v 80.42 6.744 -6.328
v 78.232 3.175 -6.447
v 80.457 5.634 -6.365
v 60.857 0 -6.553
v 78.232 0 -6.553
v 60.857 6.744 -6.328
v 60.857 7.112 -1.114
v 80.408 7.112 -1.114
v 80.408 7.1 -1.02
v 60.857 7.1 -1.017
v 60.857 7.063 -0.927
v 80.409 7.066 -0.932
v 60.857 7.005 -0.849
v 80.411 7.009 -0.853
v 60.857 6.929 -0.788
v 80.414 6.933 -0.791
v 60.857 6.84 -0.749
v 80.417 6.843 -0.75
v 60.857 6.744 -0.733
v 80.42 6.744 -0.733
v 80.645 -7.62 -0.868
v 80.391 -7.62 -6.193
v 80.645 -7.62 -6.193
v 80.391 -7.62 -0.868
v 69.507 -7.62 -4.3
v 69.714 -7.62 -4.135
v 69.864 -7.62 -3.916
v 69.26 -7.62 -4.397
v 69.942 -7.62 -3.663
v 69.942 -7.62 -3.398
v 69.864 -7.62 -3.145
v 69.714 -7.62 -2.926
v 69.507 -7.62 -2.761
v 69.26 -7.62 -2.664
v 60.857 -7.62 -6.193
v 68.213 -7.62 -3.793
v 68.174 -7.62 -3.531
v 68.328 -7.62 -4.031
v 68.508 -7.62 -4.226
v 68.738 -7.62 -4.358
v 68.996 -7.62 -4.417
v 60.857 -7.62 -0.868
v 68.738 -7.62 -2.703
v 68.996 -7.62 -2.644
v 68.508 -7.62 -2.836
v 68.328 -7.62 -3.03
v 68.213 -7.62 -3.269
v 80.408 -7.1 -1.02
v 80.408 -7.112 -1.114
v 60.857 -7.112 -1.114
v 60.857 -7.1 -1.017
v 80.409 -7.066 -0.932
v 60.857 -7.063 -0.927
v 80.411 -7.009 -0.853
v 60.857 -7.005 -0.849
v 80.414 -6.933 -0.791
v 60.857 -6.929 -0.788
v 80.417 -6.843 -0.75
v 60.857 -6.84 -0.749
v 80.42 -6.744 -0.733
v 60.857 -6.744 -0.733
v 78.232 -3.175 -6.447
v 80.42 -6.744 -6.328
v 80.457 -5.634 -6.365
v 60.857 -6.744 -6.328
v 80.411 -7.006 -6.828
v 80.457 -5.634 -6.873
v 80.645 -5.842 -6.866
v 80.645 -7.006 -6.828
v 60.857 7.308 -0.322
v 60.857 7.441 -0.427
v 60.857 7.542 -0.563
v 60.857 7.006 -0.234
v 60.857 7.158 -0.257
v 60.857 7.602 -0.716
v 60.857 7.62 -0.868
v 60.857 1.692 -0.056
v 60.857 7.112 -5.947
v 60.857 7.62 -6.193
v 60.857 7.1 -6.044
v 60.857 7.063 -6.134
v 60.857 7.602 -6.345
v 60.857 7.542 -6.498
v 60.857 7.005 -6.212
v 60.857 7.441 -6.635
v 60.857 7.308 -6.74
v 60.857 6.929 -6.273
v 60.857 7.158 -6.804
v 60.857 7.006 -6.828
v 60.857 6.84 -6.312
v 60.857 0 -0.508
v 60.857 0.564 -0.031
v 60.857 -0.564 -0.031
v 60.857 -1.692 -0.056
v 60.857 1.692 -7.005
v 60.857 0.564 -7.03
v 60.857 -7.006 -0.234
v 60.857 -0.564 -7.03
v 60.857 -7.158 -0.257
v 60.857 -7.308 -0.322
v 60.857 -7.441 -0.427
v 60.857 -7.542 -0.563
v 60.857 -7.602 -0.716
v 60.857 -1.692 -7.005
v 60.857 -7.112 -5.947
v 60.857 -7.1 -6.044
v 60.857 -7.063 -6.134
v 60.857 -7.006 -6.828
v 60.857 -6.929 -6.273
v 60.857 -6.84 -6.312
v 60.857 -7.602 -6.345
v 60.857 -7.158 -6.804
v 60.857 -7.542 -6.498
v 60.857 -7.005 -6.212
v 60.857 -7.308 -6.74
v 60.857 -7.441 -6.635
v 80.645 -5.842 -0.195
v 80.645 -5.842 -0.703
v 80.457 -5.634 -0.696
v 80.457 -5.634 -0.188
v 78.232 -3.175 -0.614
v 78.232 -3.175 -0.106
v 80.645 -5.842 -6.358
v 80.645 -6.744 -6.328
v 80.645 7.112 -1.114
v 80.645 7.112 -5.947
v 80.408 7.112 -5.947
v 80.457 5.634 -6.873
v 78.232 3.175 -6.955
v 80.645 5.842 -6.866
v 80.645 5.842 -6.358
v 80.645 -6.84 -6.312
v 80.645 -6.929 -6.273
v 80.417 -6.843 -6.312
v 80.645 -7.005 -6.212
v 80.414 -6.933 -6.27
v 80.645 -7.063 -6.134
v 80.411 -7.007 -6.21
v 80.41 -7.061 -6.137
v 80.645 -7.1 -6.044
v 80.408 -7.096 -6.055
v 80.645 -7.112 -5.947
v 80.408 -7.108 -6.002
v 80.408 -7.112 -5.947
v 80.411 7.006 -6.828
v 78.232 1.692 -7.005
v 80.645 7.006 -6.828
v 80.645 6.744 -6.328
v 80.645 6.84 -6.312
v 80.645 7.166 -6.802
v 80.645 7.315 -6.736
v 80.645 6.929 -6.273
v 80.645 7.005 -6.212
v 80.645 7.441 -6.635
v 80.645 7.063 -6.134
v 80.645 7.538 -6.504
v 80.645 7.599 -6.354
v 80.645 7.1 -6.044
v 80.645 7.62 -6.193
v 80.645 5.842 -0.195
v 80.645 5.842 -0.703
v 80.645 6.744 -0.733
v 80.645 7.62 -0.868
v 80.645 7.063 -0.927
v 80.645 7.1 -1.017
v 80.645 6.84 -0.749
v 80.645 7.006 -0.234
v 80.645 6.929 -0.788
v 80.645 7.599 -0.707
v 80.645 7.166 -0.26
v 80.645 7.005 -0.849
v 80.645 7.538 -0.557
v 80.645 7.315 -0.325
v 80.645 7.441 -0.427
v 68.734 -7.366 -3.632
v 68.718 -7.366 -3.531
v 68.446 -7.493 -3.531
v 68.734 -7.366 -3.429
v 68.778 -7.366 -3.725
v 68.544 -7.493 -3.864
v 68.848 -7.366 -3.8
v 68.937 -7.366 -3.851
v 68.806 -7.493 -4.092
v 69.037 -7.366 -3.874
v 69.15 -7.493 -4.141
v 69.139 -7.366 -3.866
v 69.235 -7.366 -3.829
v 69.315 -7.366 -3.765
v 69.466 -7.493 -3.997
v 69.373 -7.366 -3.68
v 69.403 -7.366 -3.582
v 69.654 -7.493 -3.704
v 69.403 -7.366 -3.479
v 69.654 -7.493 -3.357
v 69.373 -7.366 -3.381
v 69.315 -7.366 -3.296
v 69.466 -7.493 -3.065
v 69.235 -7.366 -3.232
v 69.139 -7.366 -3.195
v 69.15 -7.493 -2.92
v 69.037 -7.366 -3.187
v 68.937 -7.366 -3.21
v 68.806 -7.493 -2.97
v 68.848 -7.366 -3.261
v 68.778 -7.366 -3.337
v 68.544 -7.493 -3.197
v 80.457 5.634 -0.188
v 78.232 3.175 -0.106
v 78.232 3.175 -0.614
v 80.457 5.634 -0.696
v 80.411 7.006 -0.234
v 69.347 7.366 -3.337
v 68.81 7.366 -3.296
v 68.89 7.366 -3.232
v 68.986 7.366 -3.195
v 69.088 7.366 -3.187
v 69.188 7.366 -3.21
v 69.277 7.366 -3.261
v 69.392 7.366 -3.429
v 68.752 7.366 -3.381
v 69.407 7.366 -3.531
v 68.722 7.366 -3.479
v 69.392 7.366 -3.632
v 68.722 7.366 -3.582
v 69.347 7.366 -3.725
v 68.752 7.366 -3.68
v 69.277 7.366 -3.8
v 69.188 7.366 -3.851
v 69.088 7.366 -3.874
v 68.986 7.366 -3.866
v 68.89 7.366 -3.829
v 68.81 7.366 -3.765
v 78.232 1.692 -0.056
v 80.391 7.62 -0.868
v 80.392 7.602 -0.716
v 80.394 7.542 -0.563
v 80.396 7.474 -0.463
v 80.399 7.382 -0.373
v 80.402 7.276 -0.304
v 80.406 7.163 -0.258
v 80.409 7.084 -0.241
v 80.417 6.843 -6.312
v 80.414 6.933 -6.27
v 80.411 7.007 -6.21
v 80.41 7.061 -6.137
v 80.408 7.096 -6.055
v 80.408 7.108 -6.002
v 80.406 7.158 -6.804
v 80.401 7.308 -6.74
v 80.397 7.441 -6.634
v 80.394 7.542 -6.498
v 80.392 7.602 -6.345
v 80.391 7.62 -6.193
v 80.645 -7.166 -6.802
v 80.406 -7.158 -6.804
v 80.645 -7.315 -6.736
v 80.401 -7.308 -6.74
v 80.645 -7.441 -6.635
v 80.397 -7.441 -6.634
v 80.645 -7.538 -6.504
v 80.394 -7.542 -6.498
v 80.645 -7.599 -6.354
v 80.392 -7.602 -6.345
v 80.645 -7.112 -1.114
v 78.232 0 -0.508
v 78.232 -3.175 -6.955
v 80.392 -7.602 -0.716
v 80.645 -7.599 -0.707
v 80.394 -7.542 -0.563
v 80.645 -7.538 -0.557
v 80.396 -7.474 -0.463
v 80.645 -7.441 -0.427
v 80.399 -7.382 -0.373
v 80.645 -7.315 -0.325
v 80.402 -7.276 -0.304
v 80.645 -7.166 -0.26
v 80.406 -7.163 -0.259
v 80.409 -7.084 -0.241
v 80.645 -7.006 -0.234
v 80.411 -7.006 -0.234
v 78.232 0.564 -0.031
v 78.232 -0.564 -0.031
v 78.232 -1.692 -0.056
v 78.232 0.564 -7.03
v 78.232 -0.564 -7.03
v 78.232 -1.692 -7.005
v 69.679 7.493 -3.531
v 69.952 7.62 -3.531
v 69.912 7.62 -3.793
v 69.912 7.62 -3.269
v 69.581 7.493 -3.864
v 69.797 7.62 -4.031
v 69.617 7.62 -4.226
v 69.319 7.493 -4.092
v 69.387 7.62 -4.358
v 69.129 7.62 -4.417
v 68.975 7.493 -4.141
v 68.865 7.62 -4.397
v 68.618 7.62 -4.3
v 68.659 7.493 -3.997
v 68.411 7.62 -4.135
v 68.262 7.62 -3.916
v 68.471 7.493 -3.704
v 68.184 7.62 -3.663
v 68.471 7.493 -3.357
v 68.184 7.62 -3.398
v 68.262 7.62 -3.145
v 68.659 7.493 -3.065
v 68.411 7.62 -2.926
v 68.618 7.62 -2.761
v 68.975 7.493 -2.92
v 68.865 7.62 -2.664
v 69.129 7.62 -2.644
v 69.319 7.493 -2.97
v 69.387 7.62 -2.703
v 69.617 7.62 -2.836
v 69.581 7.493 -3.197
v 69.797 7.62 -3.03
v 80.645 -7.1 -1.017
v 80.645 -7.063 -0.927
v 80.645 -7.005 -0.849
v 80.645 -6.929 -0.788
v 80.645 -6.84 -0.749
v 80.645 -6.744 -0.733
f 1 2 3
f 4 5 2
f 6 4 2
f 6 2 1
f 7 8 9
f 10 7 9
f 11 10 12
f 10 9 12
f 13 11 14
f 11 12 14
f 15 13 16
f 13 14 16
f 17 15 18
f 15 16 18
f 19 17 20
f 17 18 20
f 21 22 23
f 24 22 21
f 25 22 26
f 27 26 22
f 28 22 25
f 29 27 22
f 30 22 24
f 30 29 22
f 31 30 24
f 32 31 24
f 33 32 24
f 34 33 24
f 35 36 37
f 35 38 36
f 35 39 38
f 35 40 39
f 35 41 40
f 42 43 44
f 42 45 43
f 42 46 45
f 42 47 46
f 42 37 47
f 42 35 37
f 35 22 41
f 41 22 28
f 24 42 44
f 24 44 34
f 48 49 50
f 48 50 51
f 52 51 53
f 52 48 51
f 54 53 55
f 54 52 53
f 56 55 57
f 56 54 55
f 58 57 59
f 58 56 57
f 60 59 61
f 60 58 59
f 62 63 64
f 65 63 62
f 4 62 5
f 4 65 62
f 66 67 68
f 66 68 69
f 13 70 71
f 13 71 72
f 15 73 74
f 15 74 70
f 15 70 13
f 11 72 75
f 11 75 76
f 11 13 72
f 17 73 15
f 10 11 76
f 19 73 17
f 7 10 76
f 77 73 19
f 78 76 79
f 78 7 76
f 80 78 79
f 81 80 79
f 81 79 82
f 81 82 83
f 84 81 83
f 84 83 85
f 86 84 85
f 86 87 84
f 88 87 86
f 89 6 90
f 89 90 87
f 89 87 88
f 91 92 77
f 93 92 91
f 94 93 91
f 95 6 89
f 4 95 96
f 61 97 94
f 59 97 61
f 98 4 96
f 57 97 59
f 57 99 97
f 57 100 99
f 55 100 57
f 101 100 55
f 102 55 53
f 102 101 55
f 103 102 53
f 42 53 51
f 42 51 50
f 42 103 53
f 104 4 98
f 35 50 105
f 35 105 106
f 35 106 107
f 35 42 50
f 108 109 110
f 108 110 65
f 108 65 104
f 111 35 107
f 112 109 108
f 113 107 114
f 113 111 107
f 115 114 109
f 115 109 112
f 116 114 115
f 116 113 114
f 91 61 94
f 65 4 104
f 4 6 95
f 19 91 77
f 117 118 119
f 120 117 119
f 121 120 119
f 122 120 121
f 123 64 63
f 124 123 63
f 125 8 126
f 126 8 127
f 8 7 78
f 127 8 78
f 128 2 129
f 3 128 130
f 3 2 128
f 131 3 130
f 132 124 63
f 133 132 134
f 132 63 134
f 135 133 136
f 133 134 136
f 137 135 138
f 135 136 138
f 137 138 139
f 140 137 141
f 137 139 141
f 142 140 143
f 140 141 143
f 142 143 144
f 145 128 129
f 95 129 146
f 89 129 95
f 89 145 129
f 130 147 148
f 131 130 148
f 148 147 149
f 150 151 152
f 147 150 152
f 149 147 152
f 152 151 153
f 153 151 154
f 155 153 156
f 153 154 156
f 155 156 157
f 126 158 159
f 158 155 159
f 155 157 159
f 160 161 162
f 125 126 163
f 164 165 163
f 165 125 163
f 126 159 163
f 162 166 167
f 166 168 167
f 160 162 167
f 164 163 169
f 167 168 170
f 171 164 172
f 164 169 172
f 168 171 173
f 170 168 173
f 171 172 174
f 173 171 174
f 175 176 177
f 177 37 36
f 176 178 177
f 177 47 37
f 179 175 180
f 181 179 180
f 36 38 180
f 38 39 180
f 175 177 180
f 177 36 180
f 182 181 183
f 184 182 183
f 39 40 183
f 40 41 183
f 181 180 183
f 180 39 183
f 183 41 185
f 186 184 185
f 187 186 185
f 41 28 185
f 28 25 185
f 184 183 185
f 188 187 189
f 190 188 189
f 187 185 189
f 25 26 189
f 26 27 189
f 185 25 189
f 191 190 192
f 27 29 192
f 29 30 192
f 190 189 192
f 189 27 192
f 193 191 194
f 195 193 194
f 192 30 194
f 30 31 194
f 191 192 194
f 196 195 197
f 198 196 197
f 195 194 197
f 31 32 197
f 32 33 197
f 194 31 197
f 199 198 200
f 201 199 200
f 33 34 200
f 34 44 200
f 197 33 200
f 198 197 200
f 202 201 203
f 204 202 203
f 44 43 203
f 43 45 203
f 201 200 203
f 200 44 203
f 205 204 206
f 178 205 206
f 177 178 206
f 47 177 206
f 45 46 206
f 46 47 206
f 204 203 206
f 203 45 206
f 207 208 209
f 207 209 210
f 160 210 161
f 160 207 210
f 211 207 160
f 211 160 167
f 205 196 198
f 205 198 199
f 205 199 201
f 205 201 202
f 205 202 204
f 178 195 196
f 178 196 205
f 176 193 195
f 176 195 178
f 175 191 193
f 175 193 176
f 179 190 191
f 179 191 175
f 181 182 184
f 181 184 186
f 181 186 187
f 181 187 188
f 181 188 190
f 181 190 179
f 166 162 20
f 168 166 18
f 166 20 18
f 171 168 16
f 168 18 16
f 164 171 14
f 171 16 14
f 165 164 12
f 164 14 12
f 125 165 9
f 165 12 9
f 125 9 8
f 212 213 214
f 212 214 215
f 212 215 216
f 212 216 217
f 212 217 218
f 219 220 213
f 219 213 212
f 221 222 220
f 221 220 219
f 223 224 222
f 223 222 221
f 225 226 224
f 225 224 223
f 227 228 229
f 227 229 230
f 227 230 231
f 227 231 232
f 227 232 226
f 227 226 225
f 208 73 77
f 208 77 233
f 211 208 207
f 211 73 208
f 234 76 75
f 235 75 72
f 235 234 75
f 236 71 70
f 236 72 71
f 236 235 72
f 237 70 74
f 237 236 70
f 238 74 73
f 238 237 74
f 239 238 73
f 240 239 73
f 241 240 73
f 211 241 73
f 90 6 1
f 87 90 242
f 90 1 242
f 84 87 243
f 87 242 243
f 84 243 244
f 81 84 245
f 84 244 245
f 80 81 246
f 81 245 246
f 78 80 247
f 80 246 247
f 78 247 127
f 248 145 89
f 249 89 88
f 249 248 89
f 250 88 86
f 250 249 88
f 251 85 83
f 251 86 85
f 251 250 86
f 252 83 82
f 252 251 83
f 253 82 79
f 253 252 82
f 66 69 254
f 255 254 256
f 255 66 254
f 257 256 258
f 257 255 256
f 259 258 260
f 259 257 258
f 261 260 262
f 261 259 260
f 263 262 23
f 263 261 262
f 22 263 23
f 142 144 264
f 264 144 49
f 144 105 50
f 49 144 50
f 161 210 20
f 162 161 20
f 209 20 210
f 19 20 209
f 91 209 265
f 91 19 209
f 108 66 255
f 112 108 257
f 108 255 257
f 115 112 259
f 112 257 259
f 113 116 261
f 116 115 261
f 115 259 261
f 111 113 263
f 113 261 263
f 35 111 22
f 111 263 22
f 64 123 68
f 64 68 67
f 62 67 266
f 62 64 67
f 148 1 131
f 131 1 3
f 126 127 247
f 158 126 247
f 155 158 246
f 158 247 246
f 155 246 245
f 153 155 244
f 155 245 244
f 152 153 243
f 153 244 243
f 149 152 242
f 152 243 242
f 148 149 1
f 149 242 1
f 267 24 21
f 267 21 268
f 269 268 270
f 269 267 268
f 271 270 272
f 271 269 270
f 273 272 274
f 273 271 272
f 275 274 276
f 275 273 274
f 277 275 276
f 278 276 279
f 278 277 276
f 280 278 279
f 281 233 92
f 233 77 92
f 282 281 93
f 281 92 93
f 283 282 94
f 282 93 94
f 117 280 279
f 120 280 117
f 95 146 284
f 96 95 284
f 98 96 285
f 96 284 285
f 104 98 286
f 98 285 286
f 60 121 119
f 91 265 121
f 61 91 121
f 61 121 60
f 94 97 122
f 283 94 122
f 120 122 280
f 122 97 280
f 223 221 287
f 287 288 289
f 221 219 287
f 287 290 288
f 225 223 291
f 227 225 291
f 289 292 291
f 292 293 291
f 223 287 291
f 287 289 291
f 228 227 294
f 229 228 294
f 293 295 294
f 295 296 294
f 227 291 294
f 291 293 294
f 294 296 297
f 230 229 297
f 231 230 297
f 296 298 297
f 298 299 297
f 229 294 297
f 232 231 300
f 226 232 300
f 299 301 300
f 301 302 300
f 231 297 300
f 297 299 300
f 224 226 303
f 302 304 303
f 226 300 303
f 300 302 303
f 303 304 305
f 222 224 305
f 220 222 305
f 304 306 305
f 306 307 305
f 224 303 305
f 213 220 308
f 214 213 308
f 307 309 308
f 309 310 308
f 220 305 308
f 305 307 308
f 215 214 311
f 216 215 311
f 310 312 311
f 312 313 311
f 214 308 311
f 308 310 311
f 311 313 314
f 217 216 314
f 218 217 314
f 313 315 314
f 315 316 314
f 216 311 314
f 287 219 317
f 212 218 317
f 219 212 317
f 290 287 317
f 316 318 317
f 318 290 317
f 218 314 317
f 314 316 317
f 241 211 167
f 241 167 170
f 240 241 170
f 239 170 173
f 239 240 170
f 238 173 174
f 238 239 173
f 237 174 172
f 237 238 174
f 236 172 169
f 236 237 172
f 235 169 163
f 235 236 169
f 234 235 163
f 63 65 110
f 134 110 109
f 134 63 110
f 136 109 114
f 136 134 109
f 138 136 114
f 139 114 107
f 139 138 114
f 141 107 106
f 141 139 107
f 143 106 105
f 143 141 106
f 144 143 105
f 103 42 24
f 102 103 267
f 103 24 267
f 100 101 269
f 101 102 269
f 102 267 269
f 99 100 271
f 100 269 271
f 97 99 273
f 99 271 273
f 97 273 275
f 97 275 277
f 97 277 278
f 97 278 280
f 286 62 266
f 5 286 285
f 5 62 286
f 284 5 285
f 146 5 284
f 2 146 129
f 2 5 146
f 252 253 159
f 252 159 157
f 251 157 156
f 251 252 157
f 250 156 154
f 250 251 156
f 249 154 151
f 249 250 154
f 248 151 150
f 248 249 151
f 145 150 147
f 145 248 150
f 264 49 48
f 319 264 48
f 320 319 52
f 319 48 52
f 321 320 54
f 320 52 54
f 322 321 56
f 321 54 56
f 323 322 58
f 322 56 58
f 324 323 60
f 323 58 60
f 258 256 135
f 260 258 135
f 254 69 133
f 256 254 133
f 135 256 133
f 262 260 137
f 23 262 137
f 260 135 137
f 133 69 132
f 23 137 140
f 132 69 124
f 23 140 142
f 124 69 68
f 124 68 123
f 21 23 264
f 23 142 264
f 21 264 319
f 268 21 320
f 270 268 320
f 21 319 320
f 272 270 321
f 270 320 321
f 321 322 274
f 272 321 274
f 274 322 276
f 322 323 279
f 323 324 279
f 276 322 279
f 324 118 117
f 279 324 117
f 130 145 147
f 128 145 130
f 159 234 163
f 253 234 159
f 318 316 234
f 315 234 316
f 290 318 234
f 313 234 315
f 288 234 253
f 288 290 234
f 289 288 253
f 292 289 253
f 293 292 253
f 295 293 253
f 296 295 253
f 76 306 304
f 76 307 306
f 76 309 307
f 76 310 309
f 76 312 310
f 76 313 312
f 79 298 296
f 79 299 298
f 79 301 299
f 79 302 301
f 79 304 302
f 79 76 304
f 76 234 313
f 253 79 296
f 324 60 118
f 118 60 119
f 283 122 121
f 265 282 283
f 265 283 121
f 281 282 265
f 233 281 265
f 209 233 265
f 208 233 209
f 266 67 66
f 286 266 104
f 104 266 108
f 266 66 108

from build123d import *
from build123d.topology import SkipClean

# Parameters (mm, degrees)
SKETCH1_W                     = 80.645
SKETCH1_H                     = 7.0612
BOSS_EXTRUDE1_DEPTH           = 7.62
BOSS_EXTRUDE1_TAPER           = 1.909
BOSS_EXTRUDE1_OTHER_WAY_DEPTH = 7.62
BOSS_EXTRUDE1_OTHER_WAY_TAPER = 1.909
CUT_EXTRUDE1_DEPTH            = 82.311382902
FILLET2_R                     = 0.635
FILLET3_R                     = 0.381
FILLET4_R                     = 50.8
BOSS_EXTRUDE2_DEPTH           = 80.645
CUT_EXTRUDE2_DEPTH            = 82.308937972
SKETCH7_R                     = 0.635
CUT_EXTRUDE3_DEPTH            = 1.27
SKETCH8_R                     = 0.889
CUT_EXTRUDE4_DEPTH            = 0.254
CUT_EXTRUDE4_DRAFT            = -65
SKETCH9_R                     = 0.889
CUT_EXTRUDE5_DEPTH            = 0.254
CUT_EXTRUDE5_DRAFT            = -65
CUT_EXTRUDE6_START            = 6.175959195
CUT_EXTRUDE6_DEPTH            = 0.881321808
BOSS_EXTRUDE3_REACH           = 83.309
CUT_EXTRUDE7_DEPTH            = 83.373154581
CUT_EXTRUDE7_DEPTH_BACK       = 83.373154581
SKETCH13_W                    = 68.940924303
SKETCH13_H                    = 22.731753013


# Read off the part's stored shape, not the designer's step: Cut-Extrude6
with BuildPart() as part:
    # Sketch1 → Boss-Extrude1 (new body)
    with BuildSketch(Plane(origin=(0, 0, 0), x_dir=(1, 0, 0), z_dir=(0, 1, 0))):
        with Locations((40.3225, 3.5306)):
            Rectangle(SKETCH1_W, SKETCH1_H)
    extrude(amount=BOSS_EXTRUDE1_DEPTH, taper=BOSS_EXTRUDE1_TAPER)

    # Sketch1 → Boss-Extrude1 other way (add)
    with BuildSketch(Plane(origin=(0, 0, 0), x_dir=(1, 0, 0), z_dir=(0, 1, 0))):
        with Locations((40.3225, 3.5306)):
            Rectangle(SKETCH1_W, SKETCH1_H)
    extrude(amount=-BOSS_EXTRUDE1_OTHER_WAY_DEPTH, taper=BOSS_EXTRUDE1_OTHER_WAY_TAPER)

    # Sketch4 → Cut-Extrude1 (cut, through all)
    with BuildSketch(Plane(origin=(0, 0, 0), x_dir=(0, 0, -1), z_dir=(1, 0, 0))):
        Polygon((6.552917901, 0), (6.315870177, 7.112), (0.745329823, 7.112), (0.508282099, 0), (0.745329823, -7.112), (6.315870177, -7.112), align=None)
    extrude(amount=CUT_EXTRUDE1_DEPTH, mode=Mode.SUBTRACT)

    # Fillet2
    fillet2_edges = [part.edges().sort_by_distance(p)[0] for p in [
        (40.3225, -7.62, -6.807220295),
        (40.3225, 7.62, -0.253979705),
        (40.3225, 7.62, -6.807220295),
        (40.3225, -7.62, -0.253979705),
    ]]
    fillet(fillet2_edges, radius=FILLET2_R)

    # Fillet3
    fillet3_edges = [part.edges().sort_by_distance(p)[0] for p in [
        (40.3225, 7.112, -6.315870177),
        (40.3225, 7.112, -0.745329823),
        (40.3225, -7.112, -6.315870177),
        (40.3225, -7.112, -0.745329823),
    ]]
    fillet(fillet3_edges, radius=FILLET3_R)

    # Fillet4
    # the kernel refuses this fillet: 50.8 mm, written as the material it takes off along each edge
    with BuildSketch(Plane(origin=(84.87799508, 0, -7.0612), x_dir=(0, 0.9994449956083129, 0.03331217125165235), z_dir=(-1, 0, 0)), Plane(origin=(-4.23299508, 0, 0), x_dir=(0, 0.999444995608313, -0.03331217125165188), z_dir=(1, 0, 0))) as fillet4_piece_1:
        with BuildLine():
            CenterArc((FILLET4_R * 0.0333306699198, -FILLET4_R), FILLET4_R, 90, 3.818)
            Line((-FILLET4_R * 0.0332566957808, -FILLET4_R * 0.002219401507), (0, 0))
            Line((0, 0), (FILLET4_R * 0.0333306699198, 0))
        make_face()
    extrude(amount=89.11099016, mode=Mode.SUBTRACT)

    # Sketch5 → Boss-Extrude2 (add)
    with SkipClean():  # the faces are left unmerged after this step: merging them gives an invalid solid
        with BuildSketch(Plane(origin=(0, 0, 0), x_dir=(0, 0, -1), z_dir=(1, 0, 0))):
            with BuildLine():
                Line((6.827680219, 7.006153229), (7.004795897, 1.6922583))
                ThreePointArc((7.004795897, 1.6922583), (7.025941075, 0.846246576), (7.03299012, 0))
                ThreePointArc((7.03299012, 0), (7.025941075, -0.846246576), (7.004795897, -1.6922583))
                Line((7.004795897, -1.6922583), (6.827680219, -7.006153229))
                ThreePointArc((6.827680219, -7.006153229), (6.634503314, -7.441430334), (6.193032647, -7.62))
                Line((6.193032647, -7.62), (0.868167353, -7.62))
                ThreePointArc((0.868167353, -7.62), (0.426696686, -7.441430334), (0.233519781, -7.006153229))
                Line((0.233519781, -7.006153229), (0.056404103, -1.6922583))
                ThreePointArc((0.056404103, -1.6922583), (0.035258925, -0.846246576), (0.02820988, 0))
                ThreePointArc((0.02820988, 0), (0.035258925, 0.846246576), (0.056404103, 1.6922583))
                Line((0.056404103, 1.6922583), (0.233519781, 7.006153229))
                ThreePointArc((0.233519781, 7.006153229), (0.426696686, 7.441430334), (0.868167353, 7.62))
                Line((0.868167353, 7.62), (6.193032647, 7.62))
                ThreePointArc((6.193032647, 7.62), (6.634503314, 7.441430334), (6.827680219, 7.006153229))
            make_face()
            with BuildLine():
                Line((6.328146131, 6.743691937), (6.552917901, 0))
                Line((6.552917901, 0), (6.328146131, -6.743691937))
                ThreePointArc((6.328146131, -6.743691937), (6.212239988, -7.004858201), (5.947357588, -7.112))
                Line((5.947357588, -7.112), (1.113842412, -7.112))
                ThreePointArc((1.113842412, -7.112), (0.848960012, -7.004858201), (0.733053869, -6.743691937))
                Line((0.733053869, -6.743691937), (0.508282099, 0))
                Line((0.508282099, 0), (0.733053869, 6.743691937))
                ThreePointArc((0.733053869, 6.743691937), (0.848960012, 7.004858201), (1.113842412, 7.112))
                Line((1.113842412, 7.112), (5.947357588, 7.112))
                ThreePointArc((5.947357588, 7.112), (6.212239988, 7.004858201), (6.328146131, 6.743691937))
            make_face(mode=Mode.SUBTRACT)
        extrude(amount=BOSS_EXTRUDE2_DEPTH)

    # Sketch6 → Cut-Extrude2 (cut, through all)
    with SkipClean():  # the faces are left unmerged after this step: merging them gives an invalid solid
        with BuildSketch(Plane.XY):
            Polygon((80.645, 5.842), (80.645, -5.842), (78.232, -3.175), (78.232, 3.175), align=None)
        extrude(amount=-CUT_EXTRUDE2_DEPTH, mode=Mode.SUBTRACT)

    # Sketch7 → Cut-Extrude3 (cut)
    with SkipClean():  # the faces are left unmerged after this step: merging them gives an invalid solid
        with BuildSketch(Plane.XY):
            with Locations((58.4708, 0)):
                Circle(SKETCH7_R)
        extrude(amount=-CUT_EXTRUDE3_DEPTH, mode=Mode.SUBTRACT)


with BuildPart() as cut_extrude4_tool:
    # Sketch8 → Cut-Extrude4 (with draft: the straight prism first)
    with BuildSketch(Plane(origin=(0, -7.62, 0), x_dir=(-1, 0, 0), z_dir=(0, -1, 0))):
        with Locations((-69.0626, 3.5306)):
            Circle(SKETCH8_R)
    extrude(amount=-CUT_EXTRUDE4_DEPTH)
    # Cut-Extrude4: the draft: its side faces are tilted about the plane it starts from
    cut_extrude4_sides = [cut_extrude4_tool.faces().sort_by_distance(p)[0] for p in [
        (69.9516, -7.493, -3.5306),
    ]]
    draft(cut_extrude4_sides, Plane(origin=(0, -7.62, 0), x_dir=(-1, 0, 0), z_dir=(0, -1, 0)), CUT_EXTRUDE4_DRAFT)


with BuildPart() as part_1:
    add(part.part)

    # Cut-Extrude4: cut by cut_extrude4_tool
    add(cut_extrude4_tool.part, mode=Mode.SUBTRACT)


with BuildPart() as cut_extrude5_tool:
    # Sketch9 → Cut-Extrude5 (with draft: the straight prism first)
    with BuildSketch(Plane(origin=(0, 7.62, 0), x_dir=(1, 0, 0), z_dir=(0, 1, 0))):
        with Locations((69.0626, 3.5306)):
            Circle(SKETCH9_R)
    extrude(amount=-CUT_EXTRUDE5_DEPTH)
    # Cut-Extrude5: the draft: its side faces are tilted about the plane it starts from
    cut_extrude5_sides = [cut_extrude5_tool.faces().sort_by_distance(p)[0] for p in [
        (68.1736, 7.493, -3.5306),
    ]]
    draft(cut_extrude5_sides, Plane(origin=(0, 7.62, 0), x_dir=(1, 0, 0), z_dir=(0, 1, 0)), CUT_EXTRUDE5_DRAFT)


with BuildPart() as part_2:
    add(part_1.part)

    # Cut-Extrude5: cut by cut_extrude5_tool
    add(cut_extrude5_tool.part, mode=Mode.SUBTRACT)

    # Cut-Extrude6 outline → Cut-Extrude6 (cut)
    with SkipClean():  # the faces are left unmerged after this step: merging them gives an invalid solid
        with BuildSketch(Plane(origin=(0, 0, 0), x_dir=(1, 0, 0), z_dir=(0, 0.0333121712516467, -0.9994449956083131)).offset(CUT_EXTRUDE6_START)):
            with BuildLine():
                Line((3.175214283, -5.357453783), (3.810214283, -5.357453783))
                add(Edge.make_bspline(
                    [(3.810214283, -5.357453783), (3.810214283, -4.468947182), (4.699214283, -4.468947182)],
                    knots=[0, 0, 0, 1.570796327, 1.570796327, 1.570796327], degree=2, weights=[1, 0.707106781, 1]))
                Line((4.699214283, -4.468947182), (8.001214283, -4.468947182))
                Line((8.001214283, -4.468947182), (8.001214283, -3.834299609))
                Line((8.001214283, -3.834299609), (4.699214283, -3.834299609))
                add(Edge.make_bspline(
                    [(4.699214283, -3.834299609), (3.175214283, -3.834299609), (3.175214283, -5.357453783)],
                    knots=[3.141592654, 3.141592654, 3.141592654, 4.71238898, 4.71238898, 4.71238898], degree=2, weights=[1, 0.707106781, 1]))
            make_face()
            with BuildLine():
                Line((8.001214283, -2.522694796), (4.699214283, -2.522694796))
                add(Edge.make_bspline(
                    [(4.699214283, -2.522694796), (3.810214283, -2.522694796), (3.810214283, -1.634188195), (3.810214283, -0.745681594), (4.699214283, -0.745681594)],
                    knots=[0, 0, 0, 1.570796327, 1.570796327, 3.141592654, 3.141592654, 3.141592654], degree=2, weights=[1, 0.707106781, 1, 0.707106781, 1]))
                Line((4.699214283, -0.745681594), (8.001214283, -0.745681594))
                Line((8.001214283, -0.745681594), (8.001214283, -0.111034022))
                Line((8.001214283, -0.111034022), (4.699214283, -0.111034022))
                add(Edge.make_bspline(
                    [(4.699214283, -0.111034022), (3.175214283, -0.111034022), (3.175214283, -1.634188195), (3.175214283, -3.157342368), (4.699214283, -3.157342368)],
                    knots=[1.570796327, 1.570796327, 1.570796327, 3.141592654, 3.141592654, 4.71238898, 4.71238898, 4.71238898], degree=2, weights=[1, 0.707106781, 1, 0.707106781, 1]))
                Line((4.699214283, -3.157342368), (8.001214283, -3.157342368))
                Line((8.001214283, -3.157342368), (8.001214283, -2.522694796))
            make_face()
            with BuildLine():
                Line((3.810214283, 5.812343488), (3.175214283, 5.812343488))
                add(Edge.make_bspline(
                    [(3.175214283, 5.812343488), (3.175214283, 4.289189315), (4.699214283, 4.289189315)],
                    knots=[3.141592654, 3.141592654, 3.141592654, 4.71238898, 4.71238898, 4.71238898], degree=2, weights=[1, 0.707106781, 1]))
                Line((4.699214283, 4.289189315), (8.001214283, 4.289189315))
                Line((8.001214283, 4.289189315), (8.001214283, 4.923836887))
                Line((8.001214283, 4.923836887), (4.699214283, 4.923836887))
                add(Edge.make_bspline(
                    [(4.699214283, 4.923836887), (3.810214283, 4.923836887), (3.810214283, 5.812343488)],
                    knots=[1.570796327, 1.570796327, 1.570796327, 3.141592654, 3.141592654, 3.141592654], degree=2, weights=[1, 0.707106781, 1]))
            make_face()
            with BuildLine():
                Line((8.001214283, 3.612232074), (4.699214283, 3.612232074))
                add(Edge.make_bspline(
                    [(4.699214283, 3.612232074), (3.175214283, 3.612232074), (3.175214283, 2.0890779), (3.175214283, 0.565923727), (4.699214283, 0.565923727)],
                    knots=[0, 0, 0, 1.570796327, 1.570796327, 3.141592654, 3.141592654, 3.141592654], degree=2, weights=[1, 0.707106781, 1, 0.707106781, 1]))
                Line((4.699214283, 0.565923727), (8.001214283, 0.565923727))
                Line((8.001214283, 0.565923727), (8.001214283, 1.200571299))
                Line((8.001214283, 1.200571299), (4.699214283, 1.200571299))
                add(Edge.make_bspline(
                    [(4.699214283, 1.200571299), (3.810214283, 1.200571299), (3.810214283, 2.0890779), (3.810214283, 2.977584502), (4.699214283, 2.977584502)],
                    knots=[0, 0, 0, 1.570796327, 1.570796327, 3.141592654, 3.141592654, 3.141592654], degree=2, weights=[1, 0.707106781, 1, 0.707106781, 1]))
                Line((4.699214283, 2.977584502), (8.001214283, 2.977584502))
                Line((8.001214283, 2.977584502), (8.001214283, 3.612232074))
            make_face()
        extrude(amount=CUT_EXTRUDE6_DEPTH, mode=Mode.SUBTRACT)

    # Boss-Extrude3: up to this face of the body (flat: up to its plane)
    boss_extrude3_end = Plane(part_2.part.faces().sort_by_distance((8.001214283, -0.659158971, -6.779580355))[0])
    # Sketch12 → Boss-Extrude3 (add, up to the picked face)
    with BuildSketch(Plane.ZY, mode=Mode.PRIVATE) as boss_extrude3_sk1:
        Polygon((-6.954024091, 1.690566041), (-6.776908414, 7.00446097), (-6.328146131, 6.743691937), (-6.552917901, 0), (-6.328146131, -6.743691937), (-6.776908414, -7.00446097), (-6.954024091, -1.690566041), (-7.01037179, 0), align=None)
    boss_extrude3_tool1 = split(extrude(boss_extrude3_sk1.sketch, amount=-BOSS_EXTRUDE3_REACH, mode=Mode.PRIVATE), bisect_by=boss_extrude3_end, keep=Keep.BOTH, mode=Mode.PRIVATE)
    add(boss_extrude3_tool1.solids().sort_by(Axis((0, 0, -6.668518), (1, 0, 0)))[0])

    # Sketch13 → Cut-Extrude7 (cut, two sides: drawn at the far end of the back side and taken through both)
    with BuildSketch(Plane(origin=(0, 7.62, 0), x_dir=(1, 0, 0), z_dir=(0, 1, 0)).offset(-CUT_EXTRUDE7_DEPTH_BACK)):
        with Locations((26.386659588, 2.567952151)):
            Rectangle(SKETCH13_W, SKETCH13_H)
    extrude(amount=CUT_EXTRUDE7_DEPTH + CUT_EXTRUDE7_DEPTH_BACK, mode=Mode.SUBTRACT)


solid = part_2.part
